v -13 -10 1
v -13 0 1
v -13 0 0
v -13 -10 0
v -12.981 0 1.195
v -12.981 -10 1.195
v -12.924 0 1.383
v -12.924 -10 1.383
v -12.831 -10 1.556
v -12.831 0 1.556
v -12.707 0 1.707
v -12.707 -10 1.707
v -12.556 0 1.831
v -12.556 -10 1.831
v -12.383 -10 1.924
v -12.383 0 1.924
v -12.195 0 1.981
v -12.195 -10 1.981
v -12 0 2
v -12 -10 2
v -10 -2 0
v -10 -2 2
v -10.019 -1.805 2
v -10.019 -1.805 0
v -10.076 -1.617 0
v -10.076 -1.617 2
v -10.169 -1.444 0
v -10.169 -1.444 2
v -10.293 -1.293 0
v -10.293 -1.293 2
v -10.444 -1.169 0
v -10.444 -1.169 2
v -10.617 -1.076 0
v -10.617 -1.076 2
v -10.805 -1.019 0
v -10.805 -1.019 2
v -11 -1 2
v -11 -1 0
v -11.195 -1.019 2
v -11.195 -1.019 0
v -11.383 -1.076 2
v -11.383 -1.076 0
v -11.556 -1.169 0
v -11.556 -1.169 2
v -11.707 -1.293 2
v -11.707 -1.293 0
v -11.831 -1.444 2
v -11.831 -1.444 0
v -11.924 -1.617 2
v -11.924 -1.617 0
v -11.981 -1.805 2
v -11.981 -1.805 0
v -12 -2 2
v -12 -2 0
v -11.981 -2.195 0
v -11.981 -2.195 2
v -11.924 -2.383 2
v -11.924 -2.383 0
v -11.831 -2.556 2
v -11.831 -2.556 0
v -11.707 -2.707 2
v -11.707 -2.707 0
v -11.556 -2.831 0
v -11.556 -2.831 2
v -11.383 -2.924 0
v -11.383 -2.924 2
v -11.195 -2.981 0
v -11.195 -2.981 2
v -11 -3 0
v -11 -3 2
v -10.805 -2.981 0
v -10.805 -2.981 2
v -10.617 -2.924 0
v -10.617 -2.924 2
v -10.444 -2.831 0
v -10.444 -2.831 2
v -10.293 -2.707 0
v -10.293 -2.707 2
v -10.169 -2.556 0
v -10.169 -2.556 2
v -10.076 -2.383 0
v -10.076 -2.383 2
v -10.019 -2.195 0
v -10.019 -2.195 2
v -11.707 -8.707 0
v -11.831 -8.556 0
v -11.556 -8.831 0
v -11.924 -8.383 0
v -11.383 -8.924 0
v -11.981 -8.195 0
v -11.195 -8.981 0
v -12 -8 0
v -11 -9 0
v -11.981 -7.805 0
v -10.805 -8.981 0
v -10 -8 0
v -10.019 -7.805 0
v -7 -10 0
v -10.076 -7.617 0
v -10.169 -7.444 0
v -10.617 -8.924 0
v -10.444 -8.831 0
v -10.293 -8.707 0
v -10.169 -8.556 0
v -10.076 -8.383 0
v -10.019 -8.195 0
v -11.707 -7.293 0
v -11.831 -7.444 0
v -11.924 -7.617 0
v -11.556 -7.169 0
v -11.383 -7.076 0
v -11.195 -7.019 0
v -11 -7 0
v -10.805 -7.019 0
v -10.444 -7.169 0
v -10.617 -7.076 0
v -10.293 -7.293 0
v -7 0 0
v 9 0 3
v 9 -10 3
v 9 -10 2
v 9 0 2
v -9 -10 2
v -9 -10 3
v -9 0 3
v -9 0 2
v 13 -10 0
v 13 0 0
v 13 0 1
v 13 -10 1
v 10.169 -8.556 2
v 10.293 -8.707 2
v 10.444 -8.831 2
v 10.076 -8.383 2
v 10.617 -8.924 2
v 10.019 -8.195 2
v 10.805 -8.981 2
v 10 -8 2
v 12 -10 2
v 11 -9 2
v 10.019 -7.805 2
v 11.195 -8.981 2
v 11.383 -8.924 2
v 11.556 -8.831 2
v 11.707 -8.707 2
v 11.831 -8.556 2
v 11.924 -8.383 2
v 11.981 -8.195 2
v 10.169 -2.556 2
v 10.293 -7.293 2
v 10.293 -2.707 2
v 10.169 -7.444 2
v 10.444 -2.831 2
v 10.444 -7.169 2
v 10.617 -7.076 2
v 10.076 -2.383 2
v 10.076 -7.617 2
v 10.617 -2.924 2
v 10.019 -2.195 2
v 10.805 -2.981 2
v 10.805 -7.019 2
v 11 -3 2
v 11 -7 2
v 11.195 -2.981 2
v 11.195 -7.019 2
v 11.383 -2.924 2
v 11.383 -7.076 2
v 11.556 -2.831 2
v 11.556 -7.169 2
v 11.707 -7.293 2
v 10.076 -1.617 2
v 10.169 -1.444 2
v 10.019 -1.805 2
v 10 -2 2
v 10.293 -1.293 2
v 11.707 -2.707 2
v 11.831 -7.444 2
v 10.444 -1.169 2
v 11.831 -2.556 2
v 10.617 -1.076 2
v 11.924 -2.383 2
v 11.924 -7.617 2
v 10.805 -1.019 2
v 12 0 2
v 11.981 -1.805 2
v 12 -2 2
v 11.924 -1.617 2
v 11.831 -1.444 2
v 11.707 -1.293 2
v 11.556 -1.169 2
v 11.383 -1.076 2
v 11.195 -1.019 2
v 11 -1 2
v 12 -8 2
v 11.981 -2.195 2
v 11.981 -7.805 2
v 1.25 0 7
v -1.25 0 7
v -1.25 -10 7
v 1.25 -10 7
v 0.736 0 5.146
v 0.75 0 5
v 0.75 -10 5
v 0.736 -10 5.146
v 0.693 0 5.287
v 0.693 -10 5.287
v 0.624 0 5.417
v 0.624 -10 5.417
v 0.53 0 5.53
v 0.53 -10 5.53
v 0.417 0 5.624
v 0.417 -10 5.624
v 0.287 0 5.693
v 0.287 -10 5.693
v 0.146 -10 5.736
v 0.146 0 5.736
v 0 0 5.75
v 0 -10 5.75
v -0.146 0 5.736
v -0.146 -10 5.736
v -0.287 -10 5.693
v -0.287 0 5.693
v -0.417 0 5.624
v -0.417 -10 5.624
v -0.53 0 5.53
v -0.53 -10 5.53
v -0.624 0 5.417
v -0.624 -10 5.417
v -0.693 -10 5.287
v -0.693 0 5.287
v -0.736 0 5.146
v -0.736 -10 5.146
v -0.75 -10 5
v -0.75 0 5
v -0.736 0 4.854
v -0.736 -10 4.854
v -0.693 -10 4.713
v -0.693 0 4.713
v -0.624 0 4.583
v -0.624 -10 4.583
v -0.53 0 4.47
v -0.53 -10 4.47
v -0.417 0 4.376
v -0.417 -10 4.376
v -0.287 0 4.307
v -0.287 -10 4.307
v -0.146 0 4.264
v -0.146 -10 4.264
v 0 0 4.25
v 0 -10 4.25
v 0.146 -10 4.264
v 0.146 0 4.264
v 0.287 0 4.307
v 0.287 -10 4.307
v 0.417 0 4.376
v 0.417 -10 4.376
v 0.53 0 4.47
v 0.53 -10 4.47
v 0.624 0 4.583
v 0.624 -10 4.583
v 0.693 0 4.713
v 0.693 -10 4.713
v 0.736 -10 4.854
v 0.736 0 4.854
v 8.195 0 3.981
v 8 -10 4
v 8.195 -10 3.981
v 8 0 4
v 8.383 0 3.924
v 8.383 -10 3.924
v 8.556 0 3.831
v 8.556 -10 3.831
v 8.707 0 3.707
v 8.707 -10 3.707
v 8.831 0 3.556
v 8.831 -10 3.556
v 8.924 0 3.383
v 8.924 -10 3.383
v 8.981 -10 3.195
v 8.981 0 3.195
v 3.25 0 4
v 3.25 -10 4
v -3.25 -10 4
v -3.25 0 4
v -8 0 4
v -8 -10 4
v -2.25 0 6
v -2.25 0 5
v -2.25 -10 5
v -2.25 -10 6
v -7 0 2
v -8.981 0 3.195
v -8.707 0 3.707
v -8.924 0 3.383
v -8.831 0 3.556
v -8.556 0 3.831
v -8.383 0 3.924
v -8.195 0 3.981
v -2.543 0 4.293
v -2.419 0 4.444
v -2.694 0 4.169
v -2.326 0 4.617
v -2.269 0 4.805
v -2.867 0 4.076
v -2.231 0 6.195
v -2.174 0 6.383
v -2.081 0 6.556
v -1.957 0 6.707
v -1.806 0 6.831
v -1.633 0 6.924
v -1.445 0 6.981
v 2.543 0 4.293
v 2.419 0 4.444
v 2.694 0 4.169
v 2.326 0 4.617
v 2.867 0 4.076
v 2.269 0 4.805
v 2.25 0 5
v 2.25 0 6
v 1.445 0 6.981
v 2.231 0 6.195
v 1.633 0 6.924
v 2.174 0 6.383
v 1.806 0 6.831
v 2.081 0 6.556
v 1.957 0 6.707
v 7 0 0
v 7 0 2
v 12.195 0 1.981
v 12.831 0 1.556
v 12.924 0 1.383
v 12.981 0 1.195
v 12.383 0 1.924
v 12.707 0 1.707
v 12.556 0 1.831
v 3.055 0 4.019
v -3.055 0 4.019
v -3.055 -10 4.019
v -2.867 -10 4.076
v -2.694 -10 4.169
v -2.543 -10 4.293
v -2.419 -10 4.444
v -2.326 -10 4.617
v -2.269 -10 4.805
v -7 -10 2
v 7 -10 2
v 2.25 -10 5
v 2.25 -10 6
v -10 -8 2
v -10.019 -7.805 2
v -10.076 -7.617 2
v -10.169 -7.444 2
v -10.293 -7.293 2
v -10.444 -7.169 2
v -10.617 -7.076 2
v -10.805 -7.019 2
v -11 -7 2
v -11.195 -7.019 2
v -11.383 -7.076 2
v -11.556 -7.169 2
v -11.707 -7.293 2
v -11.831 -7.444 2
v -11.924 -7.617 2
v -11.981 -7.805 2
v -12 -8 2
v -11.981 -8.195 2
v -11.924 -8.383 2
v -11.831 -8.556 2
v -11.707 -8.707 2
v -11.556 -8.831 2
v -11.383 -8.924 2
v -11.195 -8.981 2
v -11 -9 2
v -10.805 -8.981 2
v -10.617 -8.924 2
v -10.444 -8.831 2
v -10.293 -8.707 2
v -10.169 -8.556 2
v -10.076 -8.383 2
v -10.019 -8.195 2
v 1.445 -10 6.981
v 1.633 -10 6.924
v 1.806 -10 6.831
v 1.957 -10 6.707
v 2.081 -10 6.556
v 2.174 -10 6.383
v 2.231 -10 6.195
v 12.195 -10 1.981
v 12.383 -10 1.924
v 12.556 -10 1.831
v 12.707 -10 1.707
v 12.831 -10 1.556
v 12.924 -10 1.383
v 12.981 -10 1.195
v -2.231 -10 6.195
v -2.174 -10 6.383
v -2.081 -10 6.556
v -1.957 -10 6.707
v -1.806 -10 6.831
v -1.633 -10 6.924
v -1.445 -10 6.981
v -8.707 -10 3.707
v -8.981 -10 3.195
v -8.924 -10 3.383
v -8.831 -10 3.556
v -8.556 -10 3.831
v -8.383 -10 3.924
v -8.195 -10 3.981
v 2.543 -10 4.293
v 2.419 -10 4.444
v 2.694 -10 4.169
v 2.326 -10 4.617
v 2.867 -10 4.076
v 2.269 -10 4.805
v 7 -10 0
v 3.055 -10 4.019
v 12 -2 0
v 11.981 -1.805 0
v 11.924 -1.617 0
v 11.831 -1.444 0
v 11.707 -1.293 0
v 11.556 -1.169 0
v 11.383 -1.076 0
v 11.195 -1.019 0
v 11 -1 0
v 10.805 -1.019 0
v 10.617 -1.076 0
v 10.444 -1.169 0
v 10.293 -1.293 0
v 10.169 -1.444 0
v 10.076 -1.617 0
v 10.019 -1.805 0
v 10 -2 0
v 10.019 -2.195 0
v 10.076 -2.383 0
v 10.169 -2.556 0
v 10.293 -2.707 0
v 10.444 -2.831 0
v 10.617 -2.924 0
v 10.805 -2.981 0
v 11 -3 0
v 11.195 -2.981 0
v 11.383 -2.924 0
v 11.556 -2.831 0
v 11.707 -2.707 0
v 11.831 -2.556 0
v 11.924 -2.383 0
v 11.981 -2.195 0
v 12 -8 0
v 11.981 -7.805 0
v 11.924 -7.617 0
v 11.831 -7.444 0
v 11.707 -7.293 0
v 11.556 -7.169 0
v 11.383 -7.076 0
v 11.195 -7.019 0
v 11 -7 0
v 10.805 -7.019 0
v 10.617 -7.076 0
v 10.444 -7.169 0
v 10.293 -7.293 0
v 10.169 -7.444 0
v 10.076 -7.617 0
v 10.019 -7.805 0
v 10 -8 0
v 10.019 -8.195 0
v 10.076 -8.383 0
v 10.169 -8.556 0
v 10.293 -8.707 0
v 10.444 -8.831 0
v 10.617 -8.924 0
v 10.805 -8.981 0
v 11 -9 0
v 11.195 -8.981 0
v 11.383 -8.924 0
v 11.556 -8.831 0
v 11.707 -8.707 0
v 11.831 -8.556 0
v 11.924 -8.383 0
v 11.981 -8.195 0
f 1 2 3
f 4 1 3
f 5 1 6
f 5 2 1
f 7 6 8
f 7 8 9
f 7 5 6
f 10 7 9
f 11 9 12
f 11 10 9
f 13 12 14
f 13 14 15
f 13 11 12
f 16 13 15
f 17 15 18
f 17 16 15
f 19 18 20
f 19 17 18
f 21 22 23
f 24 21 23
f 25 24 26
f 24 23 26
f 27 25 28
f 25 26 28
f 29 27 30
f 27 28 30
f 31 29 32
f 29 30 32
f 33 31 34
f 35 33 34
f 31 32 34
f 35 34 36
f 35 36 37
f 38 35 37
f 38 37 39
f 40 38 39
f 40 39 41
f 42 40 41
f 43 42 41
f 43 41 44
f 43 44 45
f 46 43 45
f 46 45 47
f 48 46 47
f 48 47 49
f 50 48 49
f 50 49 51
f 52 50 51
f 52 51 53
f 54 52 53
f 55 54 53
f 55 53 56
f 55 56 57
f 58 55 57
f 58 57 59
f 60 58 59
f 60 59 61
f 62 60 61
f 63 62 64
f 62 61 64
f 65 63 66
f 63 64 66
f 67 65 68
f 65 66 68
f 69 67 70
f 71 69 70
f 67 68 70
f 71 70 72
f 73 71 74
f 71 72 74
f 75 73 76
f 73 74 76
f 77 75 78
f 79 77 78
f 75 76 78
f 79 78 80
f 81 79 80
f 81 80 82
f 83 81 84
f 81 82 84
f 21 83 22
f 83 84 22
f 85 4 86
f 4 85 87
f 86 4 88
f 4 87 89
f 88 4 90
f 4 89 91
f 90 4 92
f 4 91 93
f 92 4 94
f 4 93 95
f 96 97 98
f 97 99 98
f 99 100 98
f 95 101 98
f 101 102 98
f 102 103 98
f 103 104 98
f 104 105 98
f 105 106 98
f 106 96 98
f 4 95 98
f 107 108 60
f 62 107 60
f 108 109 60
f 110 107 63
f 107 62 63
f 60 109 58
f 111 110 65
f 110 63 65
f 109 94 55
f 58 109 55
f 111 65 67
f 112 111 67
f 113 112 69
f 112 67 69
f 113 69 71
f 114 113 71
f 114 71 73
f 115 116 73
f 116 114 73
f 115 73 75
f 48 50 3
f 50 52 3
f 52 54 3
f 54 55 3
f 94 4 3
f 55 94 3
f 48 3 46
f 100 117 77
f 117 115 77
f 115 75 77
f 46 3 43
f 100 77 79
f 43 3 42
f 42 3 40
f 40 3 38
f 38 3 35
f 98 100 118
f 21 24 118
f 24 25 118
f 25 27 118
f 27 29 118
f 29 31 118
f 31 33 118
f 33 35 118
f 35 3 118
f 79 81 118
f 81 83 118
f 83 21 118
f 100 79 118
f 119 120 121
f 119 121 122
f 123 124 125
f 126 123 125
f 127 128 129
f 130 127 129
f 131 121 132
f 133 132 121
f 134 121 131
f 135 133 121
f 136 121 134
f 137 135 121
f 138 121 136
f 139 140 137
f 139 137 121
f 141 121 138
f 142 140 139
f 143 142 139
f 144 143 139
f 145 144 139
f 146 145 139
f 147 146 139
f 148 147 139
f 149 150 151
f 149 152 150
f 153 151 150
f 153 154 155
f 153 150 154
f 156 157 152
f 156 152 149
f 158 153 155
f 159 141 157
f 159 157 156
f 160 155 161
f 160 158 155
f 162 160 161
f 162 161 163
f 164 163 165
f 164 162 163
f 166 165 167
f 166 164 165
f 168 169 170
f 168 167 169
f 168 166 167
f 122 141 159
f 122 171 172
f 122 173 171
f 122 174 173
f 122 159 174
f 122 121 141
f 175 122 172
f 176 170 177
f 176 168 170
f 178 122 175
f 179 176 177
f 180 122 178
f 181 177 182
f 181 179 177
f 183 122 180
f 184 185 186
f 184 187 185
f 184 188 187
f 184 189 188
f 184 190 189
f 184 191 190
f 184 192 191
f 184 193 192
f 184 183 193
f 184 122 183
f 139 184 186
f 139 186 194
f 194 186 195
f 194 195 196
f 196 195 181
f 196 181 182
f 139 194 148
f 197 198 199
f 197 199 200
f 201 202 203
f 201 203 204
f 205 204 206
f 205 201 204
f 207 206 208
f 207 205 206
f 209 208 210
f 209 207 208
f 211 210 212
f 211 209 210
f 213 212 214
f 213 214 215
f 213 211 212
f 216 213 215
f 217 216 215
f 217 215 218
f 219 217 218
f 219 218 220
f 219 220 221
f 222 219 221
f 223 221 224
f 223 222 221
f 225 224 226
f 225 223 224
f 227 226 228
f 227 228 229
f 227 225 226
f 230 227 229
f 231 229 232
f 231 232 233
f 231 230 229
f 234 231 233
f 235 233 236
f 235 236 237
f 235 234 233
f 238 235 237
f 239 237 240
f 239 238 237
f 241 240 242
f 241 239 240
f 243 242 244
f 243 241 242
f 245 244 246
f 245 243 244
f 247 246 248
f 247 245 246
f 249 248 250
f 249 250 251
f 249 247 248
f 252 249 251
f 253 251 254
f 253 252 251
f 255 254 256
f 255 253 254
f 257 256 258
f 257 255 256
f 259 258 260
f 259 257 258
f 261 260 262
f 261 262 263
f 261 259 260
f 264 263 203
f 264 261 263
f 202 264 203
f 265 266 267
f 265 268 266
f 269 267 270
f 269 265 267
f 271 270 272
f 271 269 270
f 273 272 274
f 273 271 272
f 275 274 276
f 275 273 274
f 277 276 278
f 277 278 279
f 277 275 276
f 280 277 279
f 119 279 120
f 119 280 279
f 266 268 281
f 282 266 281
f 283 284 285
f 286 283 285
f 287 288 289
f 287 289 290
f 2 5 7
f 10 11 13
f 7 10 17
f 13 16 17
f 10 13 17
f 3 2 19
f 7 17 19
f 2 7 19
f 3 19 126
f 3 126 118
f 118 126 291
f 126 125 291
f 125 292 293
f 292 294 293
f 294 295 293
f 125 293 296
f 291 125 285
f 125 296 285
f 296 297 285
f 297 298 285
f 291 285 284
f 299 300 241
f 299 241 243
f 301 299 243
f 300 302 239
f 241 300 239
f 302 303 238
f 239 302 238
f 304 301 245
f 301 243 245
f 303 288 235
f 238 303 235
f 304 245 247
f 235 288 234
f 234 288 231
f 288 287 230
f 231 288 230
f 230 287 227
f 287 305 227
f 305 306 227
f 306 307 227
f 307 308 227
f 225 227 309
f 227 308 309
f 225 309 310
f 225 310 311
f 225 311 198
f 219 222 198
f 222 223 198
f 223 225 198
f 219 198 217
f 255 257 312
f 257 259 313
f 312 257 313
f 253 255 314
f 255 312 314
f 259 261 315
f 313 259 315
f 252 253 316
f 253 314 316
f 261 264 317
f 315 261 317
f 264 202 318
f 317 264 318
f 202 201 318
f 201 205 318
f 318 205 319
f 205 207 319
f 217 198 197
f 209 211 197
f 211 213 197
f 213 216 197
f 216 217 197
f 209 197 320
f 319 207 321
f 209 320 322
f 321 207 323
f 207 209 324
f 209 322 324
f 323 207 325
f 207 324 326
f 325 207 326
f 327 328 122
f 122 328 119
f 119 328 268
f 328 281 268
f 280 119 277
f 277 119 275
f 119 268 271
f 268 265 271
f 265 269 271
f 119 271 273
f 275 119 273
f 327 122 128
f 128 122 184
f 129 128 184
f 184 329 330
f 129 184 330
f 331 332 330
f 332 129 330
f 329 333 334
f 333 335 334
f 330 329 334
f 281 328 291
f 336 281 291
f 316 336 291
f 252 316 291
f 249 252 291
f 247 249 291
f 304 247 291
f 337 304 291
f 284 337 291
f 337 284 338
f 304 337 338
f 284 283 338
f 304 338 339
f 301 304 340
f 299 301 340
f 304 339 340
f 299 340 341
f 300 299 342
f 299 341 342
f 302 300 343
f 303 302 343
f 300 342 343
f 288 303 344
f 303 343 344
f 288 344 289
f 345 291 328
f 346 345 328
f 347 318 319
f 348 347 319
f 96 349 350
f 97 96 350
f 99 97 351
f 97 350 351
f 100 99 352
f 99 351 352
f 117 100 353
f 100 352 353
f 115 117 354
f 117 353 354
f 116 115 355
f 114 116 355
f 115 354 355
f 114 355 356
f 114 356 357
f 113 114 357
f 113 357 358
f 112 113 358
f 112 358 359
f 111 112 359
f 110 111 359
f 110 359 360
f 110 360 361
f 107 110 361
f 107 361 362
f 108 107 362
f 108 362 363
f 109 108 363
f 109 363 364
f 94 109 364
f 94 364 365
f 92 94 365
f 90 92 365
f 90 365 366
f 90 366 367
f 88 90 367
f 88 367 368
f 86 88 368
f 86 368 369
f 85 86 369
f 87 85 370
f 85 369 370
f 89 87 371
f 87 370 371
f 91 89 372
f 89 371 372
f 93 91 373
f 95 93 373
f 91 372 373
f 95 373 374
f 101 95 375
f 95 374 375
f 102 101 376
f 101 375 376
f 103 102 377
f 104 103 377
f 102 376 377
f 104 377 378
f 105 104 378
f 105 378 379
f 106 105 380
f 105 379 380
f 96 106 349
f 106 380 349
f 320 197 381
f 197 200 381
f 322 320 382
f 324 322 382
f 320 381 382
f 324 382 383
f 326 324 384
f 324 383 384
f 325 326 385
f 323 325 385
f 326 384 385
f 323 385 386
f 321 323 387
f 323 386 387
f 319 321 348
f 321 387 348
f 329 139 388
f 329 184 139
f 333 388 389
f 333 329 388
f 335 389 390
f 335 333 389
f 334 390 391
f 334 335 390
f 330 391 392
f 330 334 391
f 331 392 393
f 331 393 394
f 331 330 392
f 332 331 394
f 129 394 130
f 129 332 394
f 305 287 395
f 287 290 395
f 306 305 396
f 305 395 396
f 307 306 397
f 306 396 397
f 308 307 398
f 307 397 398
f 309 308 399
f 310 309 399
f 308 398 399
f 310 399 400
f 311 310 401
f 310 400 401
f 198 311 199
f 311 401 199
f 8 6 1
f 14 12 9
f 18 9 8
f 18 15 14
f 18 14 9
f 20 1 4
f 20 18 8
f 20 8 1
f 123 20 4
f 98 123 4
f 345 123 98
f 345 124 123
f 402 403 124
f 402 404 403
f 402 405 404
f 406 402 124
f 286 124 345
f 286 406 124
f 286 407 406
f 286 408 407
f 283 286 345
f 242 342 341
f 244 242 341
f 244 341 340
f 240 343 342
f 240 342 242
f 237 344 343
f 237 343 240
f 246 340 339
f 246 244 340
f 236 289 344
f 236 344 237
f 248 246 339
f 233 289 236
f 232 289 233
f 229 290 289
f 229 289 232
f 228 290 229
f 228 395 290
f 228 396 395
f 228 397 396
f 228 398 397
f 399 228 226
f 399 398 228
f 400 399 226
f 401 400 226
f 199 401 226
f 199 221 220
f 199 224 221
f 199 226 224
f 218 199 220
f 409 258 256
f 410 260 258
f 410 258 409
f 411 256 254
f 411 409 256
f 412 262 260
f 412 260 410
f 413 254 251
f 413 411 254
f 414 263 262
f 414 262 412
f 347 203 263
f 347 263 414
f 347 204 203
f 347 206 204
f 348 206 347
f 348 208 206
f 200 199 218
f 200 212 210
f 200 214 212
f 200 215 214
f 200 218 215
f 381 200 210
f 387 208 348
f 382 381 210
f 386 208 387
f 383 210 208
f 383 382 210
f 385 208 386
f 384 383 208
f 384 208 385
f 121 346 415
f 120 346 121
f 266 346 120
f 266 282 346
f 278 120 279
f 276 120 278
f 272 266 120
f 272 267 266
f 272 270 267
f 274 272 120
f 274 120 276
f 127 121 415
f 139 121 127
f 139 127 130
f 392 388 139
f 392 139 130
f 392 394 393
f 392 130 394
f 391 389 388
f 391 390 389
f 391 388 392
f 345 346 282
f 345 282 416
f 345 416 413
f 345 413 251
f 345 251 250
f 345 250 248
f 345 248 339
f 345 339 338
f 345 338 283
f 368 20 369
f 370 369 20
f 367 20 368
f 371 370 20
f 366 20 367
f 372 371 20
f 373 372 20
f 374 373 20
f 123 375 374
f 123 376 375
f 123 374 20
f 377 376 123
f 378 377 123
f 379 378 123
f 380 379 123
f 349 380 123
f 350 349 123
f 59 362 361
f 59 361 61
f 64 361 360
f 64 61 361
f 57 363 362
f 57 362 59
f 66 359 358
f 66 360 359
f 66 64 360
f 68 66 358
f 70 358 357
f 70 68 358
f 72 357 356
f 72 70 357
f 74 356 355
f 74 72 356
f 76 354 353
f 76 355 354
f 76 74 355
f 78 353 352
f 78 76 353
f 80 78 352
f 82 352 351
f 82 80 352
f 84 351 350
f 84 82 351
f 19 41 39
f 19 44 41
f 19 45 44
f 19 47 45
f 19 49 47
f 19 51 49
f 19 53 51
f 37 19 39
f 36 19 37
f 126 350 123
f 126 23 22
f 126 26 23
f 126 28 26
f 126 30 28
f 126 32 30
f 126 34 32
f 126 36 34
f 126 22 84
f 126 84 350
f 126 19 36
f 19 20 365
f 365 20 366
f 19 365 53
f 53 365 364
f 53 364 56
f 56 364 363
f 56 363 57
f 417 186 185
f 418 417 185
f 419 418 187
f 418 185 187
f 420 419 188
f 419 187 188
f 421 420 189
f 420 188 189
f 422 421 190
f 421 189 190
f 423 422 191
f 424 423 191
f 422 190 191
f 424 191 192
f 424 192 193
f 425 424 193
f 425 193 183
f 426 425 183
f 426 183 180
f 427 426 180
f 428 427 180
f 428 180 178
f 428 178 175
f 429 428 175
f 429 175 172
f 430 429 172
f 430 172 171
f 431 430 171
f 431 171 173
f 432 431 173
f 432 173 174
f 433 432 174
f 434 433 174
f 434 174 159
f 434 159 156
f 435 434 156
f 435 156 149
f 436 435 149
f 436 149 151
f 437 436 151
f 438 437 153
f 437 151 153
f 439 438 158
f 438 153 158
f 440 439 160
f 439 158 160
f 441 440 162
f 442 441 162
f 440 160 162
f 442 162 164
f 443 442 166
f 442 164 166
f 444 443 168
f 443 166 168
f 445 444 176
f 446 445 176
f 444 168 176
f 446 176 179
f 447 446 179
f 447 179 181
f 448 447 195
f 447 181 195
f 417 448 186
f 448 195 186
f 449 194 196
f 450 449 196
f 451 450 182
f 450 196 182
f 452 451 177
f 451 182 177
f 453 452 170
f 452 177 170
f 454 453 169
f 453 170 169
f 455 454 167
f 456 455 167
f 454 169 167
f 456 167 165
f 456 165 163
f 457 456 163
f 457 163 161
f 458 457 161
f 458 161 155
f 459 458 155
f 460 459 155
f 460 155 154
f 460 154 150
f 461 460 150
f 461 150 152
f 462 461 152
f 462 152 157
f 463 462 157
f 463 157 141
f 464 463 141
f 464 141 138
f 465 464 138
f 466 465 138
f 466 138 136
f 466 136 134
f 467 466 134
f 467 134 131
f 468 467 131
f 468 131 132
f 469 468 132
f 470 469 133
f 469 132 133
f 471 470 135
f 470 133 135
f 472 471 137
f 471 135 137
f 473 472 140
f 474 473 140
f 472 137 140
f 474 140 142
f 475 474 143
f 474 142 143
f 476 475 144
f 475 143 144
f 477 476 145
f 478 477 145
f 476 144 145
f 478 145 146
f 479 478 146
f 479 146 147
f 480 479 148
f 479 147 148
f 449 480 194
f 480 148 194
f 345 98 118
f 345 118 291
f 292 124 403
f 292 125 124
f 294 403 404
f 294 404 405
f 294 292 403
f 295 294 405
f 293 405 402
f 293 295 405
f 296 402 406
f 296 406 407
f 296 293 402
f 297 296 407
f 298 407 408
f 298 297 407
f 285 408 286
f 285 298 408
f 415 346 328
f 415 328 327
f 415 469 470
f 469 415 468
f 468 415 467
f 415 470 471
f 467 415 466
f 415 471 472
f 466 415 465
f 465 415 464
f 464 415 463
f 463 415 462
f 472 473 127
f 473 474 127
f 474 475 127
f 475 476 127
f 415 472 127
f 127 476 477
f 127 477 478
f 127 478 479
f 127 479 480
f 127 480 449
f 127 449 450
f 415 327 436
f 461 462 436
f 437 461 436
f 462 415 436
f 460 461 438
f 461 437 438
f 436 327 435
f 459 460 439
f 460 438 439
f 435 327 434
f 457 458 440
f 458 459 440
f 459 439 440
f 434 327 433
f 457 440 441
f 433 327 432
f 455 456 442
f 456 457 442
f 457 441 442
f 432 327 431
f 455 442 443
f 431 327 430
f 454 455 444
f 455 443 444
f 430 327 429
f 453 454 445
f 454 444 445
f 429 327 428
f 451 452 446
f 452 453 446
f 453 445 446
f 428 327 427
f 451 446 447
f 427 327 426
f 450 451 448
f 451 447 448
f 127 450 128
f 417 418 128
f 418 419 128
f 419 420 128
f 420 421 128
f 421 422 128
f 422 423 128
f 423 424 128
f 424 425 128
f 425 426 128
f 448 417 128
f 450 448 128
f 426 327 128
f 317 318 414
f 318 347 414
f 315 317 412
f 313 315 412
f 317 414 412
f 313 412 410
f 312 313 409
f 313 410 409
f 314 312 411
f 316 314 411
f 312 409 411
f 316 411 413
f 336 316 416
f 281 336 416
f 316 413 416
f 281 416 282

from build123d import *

# Parameters (mm, degrees)
F0_W     = 4.5
F0_H     = 3
F0_R     = 0.75
F1_DEPTH = 10
F2_R     = 1
F3_DEPTH = 4
F4_R     = 1
F5_DEPTH = 4
F6_W     = 4
F6_H     = 10
F6_R     = 1
F7_DEPTH = 2
F8_W     = 4
F8_H     = 10
F8_R     = 1
F9_DEPTH = 2
F10_R    = 0.99999


# Not quite as in the source:
# - a fillet or chamfer is up to 0.001 mm smaller than in the source, because OpenCascade refuses the exact size


with BuildPart() as f1:
    # F0 (on Front) → F1 (new body)
    with BuildSketch(Plane.XZ):
        Polygon((-13, 4), (-13, 0), (-7, 0), (-7, 2), (7, 2), (7, 0), (13, 0), (13, 4), (2.25, 4), (-2.25, 4), align=None)
        with Locations((0, 5.5)):
            Rectangle(F0_W, F0_H)
        with Locations((0, 5)):
            Circle(F0_R, mode=Mode.SUBTRACT)
    extrude(amount=F1_DEPTH)

    # F2 (on face) → F3 (cut)
    with BuildSketch(Plane.XY.offset(4)):
        with Locations((-11, -2)):
            Circle(F2_R)
        with Locations((-11, -8)):
            Circle(F2_R)
    extrude(amount=-F3_DEPTH, mode=Mode.SUBTRACT)

    # F4 (on face) → F5 (cut)
    with BuildSketch(Plane.XY.offset(4)):
        with Locations((11, -2)):
            Circle(F4_R)
        with Locations((11, -8)):
            Circle(F4_R)
    extrude(amount=-F5_DEPTH, mode=Mode.SUBTRACT)

    # F6 (on face) → F7 (cut)
    with BuildSketch(Plane.XY.offset(4)):
        with Locations((-11, -5)):
            Rectangle(F6_W, F6_H)
        with Locations((-11, -8)):
            Circle(F6_R, mode=Mode.SUBTRACT)
        with Locations((-11, -2)):
            Circle(F6_R, mode=Mode.SUBTRACT)
    extrude(amount=-F7_DEPTH, mode=Mode.SUBTRACT)

    # F8 (on face) → F9 (cut)
    with BuildSketch(Plane.XY.offset(4)):
        with Locations((11, -5)):
            Rectangle(F8_W, F8_H)
        with Locations((11, -8)):
            Circle(F8_R, mode=Mode.SUBTRACT)
        with Locations((11, -2)):
            Circle(F8_R, mode=Mode.SUBTRACT)
    extrude(amount=-F9_DEPTH, mode=Mode.SUBTRACT)

    # F10 (radius 1 in the source; OpenCascade refuses exactly that, so slightly less here)
    f10_edges = [f1.edges().sort_by_distance(p)[0] for p in [
        (-9, -5, 4),
        (-2.25, -5, 7),
        (-2.25, -5, 4),
        (2.25, -5, 7),
        (2.25, -5, 4),
        (9, -5, 4),
        (-13, -5, 2),
        (13, -5, 2),
    ]]
    fillet(f10_edges, radius=F10_R)


solid = f1.part
